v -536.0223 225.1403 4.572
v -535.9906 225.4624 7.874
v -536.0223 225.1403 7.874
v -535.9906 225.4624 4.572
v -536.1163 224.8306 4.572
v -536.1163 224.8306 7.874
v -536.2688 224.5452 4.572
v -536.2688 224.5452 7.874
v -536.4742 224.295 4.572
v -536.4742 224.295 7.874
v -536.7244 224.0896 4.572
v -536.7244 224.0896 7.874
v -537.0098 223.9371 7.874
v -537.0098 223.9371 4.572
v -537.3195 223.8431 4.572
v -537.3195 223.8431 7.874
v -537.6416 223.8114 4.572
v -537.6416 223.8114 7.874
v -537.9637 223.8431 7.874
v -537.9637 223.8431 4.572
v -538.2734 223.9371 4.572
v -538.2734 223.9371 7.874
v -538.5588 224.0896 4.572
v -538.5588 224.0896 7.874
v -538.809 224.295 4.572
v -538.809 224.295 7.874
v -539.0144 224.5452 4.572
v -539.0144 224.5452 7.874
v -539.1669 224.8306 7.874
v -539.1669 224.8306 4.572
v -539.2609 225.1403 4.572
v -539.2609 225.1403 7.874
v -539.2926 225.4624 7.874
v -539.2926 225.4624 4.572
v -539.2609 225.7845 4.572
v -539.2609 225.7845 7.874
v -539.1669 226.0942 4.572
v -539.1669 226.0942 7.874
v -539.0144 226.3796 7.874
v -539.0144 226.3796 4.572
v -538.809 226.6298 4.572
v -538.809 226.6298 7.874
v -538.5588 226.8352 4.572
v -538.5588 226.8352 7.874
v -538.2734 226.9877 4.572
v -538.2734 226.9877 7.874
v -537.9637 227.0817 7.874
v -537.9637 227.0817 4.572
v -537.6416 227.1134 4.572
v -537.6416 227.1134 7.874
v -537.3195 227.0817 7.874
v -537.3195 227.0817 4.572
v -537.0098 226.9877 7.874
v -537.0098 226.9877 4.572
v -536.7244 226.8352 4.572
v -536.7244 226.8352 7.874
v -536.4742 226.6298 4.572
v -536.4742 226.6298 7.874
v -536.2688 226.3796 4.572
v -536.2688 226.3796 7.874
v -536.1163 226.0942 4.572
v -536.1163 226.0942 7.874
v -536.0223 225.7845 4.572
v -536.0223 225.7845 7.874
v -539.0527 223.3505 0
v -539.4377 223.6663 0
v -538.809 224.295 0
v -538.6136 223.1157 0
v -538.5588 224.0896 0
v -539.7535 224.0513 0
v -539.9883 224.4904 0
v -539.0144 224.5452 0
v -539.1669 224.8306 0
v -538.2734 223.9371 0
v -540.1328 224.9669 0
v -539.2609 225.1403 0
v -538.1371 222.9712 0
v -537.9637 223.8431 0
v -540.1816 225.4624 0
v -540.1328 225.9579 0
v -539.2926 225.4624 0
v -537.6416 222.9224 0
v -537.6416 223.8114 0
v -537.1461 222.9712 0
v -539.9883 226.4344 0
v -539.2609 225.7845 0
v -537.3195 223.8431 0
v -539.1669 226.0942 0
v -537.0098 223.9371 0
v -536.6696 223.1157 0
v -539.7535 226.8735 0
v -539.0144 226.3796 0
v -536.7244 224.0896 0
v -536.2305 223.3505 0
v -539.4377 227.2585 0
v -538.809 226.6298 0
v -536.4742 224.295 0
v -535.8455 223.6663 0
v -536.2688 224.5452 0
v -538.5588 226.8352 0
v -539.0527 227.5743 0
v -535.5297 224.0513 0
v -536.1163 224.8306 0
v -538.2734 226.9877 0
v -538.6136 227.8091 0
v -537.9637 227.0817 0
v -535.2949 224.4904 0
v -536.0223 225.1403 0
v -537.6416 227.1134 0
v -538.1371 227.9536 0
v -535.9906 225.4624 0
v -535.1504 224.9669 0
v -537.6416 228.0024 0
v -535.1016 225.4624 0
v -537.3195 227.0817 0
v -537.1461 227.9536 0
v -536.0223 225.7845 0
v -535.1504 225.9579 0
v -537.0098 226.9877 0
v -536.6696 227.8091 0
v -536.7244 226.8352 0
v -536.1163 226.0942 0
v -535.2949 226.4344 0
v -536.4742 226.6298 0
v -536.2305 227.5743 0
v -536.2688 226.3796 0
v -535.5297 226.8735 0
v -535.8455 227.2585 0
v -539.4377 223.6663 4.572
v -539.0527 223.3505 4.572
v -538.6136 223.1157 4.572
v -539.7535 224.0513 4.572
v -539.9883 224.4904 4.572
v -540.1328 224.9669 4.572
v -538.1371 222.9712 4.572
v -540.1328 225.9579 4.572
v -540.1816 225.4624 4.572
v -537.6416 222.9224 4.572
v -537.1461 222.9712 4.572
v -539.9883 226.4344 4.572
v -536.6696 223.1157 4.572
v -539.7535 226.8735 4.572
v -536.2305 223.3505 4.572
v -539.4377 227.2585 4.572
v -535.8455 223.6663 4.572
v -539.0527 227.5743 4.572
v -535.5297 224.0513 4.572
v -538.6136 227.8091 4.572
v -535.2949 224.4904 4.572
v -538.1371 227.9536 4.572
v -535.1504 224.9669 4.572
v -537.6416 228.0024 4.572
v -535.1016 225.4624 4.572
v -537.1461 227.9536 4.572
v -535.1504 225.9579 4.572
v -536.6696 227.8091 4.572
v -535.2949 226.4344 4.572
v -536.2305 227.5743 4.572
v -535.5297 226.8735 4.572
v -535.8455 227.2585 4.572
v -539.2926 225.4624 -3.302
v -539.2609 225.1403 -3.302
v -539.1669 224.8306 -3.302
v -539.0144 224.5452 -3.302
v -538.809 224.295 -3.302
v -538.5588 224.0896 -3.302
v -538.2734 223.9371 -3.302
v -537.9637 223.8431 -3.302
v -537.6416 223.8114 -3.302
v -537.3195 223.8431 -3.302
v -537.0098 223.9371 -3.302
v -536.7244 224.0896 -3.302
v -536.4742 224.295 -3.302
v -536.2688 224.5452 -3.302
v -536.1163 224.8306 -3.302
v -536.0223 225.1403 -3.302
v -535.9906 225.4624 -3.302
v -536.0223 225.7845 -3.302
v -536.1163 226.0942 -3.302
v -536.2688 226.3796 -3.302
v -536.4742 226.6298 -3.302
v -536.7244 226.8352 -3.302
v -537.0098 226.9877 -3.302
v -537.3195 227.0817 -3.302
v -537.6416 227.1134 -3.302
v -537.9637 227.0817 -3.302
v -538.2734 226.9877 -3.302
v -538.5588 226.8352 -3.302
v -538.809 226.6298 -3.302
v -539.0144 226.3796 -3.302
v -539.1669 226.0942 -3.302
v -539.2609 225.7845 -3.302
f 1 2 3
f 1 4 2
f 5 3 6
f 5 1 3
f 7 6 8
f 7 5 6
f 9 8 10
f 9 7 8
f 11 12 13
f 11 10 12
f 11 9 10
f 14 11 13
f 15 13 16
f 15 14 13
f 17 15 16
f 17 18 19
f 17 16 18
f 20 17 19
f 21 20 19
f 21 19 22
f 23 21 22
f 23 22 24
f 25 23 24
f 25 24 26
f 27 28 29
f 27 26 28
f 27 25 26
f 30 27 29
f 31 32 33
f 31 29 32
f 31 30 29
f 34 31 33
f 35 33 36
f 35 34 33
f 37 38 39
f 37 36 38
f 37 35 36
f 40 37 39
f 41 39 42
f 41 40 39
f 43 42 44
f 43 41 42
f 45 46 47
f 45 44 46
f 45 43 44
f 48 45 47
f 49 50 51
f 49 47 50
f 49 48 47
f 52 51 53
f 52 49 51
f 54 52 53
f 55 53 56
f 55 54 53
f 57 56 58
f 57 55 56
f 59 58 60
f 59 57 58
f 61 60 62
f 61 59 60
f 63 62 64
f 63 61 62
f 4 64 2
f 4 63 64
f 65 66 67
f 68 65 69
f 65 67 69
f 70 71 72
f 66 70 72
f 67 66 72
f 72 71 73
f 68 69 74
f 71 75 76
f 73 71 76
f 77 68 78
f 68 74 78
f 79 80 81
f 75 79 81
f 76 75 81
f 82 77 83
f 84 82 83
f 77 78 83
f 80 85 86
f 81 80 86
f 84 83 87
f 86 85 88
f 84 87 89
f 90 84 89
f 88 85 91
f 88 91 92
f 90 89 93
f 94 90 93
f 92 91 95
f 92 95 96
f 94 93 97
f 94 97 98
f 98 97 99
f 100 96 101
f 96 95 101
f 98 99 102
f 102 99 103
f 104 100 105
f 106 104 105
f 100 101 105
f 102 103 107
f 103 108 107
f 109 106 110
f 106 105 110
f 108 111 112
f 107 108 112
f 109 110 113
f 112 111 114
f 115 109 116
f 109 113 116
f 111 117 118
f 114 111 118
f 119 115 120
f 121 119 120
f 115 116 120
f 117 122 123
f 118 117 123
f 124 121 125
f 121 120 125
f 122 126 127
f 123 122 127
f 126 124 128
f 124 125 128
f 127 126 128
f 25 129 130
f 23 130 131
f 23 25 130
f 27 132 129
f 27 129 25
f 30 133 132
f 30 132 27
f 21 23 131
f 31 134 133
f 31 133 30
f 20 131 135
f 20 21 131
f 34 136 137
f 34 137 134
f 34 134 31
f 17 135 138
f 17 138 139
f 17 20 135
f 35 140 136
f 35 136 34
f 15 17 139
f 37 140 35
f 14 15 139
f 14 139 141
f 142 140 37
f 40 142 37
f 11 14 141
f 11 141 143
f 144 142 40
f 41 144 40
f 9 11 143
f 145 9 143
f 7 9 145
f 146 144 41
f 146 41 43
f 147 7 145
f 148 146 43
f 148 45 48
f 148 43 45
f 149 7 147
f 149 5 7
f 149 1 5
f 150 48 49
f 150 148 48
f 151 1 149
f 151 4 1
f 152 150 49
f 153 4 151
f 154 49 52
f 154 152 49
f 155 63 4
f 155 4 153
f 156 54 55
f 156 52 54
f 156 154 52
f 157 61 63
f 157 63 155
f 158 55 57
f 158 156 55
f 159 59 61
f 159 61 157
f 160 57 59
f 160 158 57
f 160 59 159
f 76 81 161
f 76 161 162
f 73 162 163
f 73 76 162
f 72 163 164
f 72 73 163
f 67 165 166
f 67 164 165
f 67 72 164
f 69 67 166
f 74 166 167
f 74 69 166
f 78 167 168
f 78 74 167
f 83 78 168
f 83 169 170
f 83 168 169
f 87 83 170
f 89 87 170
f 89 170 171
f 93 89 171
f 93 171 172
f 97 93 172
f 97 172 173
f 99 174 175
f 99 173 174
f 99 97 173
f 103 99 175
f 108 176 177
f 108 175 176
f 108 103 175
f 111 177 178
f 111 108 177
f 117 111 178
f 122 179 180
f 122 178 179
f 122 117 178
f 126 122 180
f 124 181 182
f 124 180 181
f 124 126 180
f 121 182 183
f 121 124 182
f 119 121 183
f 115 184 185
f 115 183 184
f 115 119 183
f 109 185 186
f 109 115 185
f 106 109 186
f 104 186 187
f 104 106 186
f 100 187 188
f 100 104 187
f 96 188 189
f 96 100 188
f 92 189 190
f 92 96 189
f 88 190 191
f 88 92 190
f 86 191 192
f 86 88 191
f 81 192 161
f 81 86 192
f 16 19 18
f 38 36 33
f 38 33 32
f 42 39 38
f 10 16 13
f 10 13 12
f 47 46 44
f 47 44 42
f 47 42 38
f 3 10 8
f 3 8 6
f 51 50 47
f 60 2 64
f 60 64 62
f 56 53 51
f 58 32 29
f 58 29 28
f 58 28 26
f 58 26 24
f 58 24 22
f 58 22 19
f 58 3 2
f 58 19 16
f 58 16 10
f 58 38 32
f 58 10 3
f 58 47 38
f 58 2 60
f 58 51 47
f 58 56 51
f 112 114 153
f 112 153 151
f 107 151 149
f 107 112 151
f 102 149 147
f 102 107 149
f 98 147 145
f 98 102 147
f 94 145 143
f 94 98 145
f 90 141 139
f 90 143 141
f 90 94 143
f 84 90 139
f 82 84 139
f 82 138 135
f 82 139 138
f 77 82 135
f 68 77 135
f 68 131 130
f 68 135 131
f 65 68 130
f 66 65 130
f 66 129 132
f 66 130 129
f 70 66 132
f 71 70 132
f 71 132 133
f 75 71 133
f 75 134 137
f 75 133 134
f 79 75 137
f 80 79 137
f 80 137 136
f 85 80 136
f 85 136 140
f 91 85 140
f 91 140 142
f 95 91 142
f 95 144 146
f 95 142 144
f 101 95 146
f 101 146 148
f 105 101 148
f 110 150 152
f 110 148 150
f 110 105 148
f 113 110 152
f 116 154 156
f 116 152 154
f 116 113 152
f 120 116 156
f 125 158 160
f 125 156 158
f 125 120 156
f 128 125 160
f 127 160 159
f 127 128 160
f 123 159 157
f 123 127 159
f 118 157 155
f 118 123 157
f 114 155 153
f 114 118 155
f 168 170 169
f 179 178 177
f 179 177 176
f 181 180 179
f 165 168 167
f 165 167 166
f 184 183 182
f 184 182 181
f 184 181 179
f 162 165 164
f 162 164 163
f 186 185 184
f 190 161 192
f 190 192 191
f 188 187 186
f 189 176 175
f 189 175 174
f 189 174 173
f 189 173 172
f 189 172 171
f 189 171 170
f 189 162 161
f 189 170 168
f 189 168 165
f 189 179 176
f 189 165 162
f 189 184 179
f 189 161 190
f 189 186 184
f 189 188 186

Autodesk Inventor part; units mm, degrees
ref_plane "YZ Plane" through (0, 0, 0) normal (1, 0, 0) x (0, 1, 0)
ref_plane "XZ Plane" through (0, 0, 0) normal (0, 1, 0) x (-1, 0, 0)
ref_plane "XY Plane" through (0, 0, 0) normal (0, 0, 1) x (1, 0, 0)
sketch "Sketch1" plane through (0, 0, 0) normal (0, 0, 1) x (1, 0, 0)
  circle A0 centre (-537.6416, 225.4624) radius 2.54
  point P0 (0, 0)
  dimension "d0" = 5.08
extrude "Extrusion1" add sketch "Sketch1" along normal blind 4.572
sketch "Sketch2" plane through (-537.6416, 225.4624, 4.572) normal (0, 0, 1) x (1, 0, 0)
  circle A0 centre (0, 0) radius 2.54 projected
  circle A1 centre (0, 0) radius 1.651
  point P0 (537.6416, -225.4624)
  dimension "d3" = 3.302
extrude "Extrusion2" add sketch "Sketch2" along normal blind 3.302 contours A1
sketch "Sketch3" plane through (-537.6416, 225.4624, 0) normal (0, 0, -1) x (-1, 0, 0)
  circle A0 centre (0, 0) radius 2.54 projected
  circle A1 centre (0, 0) radius 1.651
  point P0 (-537.6416, -225.4624)
  dimension "d6" = 3.302
extrude "Extrusion3" add sketch "Sketch3" along normal blind 3.302 contours A1
properties part number "chain_axel"
